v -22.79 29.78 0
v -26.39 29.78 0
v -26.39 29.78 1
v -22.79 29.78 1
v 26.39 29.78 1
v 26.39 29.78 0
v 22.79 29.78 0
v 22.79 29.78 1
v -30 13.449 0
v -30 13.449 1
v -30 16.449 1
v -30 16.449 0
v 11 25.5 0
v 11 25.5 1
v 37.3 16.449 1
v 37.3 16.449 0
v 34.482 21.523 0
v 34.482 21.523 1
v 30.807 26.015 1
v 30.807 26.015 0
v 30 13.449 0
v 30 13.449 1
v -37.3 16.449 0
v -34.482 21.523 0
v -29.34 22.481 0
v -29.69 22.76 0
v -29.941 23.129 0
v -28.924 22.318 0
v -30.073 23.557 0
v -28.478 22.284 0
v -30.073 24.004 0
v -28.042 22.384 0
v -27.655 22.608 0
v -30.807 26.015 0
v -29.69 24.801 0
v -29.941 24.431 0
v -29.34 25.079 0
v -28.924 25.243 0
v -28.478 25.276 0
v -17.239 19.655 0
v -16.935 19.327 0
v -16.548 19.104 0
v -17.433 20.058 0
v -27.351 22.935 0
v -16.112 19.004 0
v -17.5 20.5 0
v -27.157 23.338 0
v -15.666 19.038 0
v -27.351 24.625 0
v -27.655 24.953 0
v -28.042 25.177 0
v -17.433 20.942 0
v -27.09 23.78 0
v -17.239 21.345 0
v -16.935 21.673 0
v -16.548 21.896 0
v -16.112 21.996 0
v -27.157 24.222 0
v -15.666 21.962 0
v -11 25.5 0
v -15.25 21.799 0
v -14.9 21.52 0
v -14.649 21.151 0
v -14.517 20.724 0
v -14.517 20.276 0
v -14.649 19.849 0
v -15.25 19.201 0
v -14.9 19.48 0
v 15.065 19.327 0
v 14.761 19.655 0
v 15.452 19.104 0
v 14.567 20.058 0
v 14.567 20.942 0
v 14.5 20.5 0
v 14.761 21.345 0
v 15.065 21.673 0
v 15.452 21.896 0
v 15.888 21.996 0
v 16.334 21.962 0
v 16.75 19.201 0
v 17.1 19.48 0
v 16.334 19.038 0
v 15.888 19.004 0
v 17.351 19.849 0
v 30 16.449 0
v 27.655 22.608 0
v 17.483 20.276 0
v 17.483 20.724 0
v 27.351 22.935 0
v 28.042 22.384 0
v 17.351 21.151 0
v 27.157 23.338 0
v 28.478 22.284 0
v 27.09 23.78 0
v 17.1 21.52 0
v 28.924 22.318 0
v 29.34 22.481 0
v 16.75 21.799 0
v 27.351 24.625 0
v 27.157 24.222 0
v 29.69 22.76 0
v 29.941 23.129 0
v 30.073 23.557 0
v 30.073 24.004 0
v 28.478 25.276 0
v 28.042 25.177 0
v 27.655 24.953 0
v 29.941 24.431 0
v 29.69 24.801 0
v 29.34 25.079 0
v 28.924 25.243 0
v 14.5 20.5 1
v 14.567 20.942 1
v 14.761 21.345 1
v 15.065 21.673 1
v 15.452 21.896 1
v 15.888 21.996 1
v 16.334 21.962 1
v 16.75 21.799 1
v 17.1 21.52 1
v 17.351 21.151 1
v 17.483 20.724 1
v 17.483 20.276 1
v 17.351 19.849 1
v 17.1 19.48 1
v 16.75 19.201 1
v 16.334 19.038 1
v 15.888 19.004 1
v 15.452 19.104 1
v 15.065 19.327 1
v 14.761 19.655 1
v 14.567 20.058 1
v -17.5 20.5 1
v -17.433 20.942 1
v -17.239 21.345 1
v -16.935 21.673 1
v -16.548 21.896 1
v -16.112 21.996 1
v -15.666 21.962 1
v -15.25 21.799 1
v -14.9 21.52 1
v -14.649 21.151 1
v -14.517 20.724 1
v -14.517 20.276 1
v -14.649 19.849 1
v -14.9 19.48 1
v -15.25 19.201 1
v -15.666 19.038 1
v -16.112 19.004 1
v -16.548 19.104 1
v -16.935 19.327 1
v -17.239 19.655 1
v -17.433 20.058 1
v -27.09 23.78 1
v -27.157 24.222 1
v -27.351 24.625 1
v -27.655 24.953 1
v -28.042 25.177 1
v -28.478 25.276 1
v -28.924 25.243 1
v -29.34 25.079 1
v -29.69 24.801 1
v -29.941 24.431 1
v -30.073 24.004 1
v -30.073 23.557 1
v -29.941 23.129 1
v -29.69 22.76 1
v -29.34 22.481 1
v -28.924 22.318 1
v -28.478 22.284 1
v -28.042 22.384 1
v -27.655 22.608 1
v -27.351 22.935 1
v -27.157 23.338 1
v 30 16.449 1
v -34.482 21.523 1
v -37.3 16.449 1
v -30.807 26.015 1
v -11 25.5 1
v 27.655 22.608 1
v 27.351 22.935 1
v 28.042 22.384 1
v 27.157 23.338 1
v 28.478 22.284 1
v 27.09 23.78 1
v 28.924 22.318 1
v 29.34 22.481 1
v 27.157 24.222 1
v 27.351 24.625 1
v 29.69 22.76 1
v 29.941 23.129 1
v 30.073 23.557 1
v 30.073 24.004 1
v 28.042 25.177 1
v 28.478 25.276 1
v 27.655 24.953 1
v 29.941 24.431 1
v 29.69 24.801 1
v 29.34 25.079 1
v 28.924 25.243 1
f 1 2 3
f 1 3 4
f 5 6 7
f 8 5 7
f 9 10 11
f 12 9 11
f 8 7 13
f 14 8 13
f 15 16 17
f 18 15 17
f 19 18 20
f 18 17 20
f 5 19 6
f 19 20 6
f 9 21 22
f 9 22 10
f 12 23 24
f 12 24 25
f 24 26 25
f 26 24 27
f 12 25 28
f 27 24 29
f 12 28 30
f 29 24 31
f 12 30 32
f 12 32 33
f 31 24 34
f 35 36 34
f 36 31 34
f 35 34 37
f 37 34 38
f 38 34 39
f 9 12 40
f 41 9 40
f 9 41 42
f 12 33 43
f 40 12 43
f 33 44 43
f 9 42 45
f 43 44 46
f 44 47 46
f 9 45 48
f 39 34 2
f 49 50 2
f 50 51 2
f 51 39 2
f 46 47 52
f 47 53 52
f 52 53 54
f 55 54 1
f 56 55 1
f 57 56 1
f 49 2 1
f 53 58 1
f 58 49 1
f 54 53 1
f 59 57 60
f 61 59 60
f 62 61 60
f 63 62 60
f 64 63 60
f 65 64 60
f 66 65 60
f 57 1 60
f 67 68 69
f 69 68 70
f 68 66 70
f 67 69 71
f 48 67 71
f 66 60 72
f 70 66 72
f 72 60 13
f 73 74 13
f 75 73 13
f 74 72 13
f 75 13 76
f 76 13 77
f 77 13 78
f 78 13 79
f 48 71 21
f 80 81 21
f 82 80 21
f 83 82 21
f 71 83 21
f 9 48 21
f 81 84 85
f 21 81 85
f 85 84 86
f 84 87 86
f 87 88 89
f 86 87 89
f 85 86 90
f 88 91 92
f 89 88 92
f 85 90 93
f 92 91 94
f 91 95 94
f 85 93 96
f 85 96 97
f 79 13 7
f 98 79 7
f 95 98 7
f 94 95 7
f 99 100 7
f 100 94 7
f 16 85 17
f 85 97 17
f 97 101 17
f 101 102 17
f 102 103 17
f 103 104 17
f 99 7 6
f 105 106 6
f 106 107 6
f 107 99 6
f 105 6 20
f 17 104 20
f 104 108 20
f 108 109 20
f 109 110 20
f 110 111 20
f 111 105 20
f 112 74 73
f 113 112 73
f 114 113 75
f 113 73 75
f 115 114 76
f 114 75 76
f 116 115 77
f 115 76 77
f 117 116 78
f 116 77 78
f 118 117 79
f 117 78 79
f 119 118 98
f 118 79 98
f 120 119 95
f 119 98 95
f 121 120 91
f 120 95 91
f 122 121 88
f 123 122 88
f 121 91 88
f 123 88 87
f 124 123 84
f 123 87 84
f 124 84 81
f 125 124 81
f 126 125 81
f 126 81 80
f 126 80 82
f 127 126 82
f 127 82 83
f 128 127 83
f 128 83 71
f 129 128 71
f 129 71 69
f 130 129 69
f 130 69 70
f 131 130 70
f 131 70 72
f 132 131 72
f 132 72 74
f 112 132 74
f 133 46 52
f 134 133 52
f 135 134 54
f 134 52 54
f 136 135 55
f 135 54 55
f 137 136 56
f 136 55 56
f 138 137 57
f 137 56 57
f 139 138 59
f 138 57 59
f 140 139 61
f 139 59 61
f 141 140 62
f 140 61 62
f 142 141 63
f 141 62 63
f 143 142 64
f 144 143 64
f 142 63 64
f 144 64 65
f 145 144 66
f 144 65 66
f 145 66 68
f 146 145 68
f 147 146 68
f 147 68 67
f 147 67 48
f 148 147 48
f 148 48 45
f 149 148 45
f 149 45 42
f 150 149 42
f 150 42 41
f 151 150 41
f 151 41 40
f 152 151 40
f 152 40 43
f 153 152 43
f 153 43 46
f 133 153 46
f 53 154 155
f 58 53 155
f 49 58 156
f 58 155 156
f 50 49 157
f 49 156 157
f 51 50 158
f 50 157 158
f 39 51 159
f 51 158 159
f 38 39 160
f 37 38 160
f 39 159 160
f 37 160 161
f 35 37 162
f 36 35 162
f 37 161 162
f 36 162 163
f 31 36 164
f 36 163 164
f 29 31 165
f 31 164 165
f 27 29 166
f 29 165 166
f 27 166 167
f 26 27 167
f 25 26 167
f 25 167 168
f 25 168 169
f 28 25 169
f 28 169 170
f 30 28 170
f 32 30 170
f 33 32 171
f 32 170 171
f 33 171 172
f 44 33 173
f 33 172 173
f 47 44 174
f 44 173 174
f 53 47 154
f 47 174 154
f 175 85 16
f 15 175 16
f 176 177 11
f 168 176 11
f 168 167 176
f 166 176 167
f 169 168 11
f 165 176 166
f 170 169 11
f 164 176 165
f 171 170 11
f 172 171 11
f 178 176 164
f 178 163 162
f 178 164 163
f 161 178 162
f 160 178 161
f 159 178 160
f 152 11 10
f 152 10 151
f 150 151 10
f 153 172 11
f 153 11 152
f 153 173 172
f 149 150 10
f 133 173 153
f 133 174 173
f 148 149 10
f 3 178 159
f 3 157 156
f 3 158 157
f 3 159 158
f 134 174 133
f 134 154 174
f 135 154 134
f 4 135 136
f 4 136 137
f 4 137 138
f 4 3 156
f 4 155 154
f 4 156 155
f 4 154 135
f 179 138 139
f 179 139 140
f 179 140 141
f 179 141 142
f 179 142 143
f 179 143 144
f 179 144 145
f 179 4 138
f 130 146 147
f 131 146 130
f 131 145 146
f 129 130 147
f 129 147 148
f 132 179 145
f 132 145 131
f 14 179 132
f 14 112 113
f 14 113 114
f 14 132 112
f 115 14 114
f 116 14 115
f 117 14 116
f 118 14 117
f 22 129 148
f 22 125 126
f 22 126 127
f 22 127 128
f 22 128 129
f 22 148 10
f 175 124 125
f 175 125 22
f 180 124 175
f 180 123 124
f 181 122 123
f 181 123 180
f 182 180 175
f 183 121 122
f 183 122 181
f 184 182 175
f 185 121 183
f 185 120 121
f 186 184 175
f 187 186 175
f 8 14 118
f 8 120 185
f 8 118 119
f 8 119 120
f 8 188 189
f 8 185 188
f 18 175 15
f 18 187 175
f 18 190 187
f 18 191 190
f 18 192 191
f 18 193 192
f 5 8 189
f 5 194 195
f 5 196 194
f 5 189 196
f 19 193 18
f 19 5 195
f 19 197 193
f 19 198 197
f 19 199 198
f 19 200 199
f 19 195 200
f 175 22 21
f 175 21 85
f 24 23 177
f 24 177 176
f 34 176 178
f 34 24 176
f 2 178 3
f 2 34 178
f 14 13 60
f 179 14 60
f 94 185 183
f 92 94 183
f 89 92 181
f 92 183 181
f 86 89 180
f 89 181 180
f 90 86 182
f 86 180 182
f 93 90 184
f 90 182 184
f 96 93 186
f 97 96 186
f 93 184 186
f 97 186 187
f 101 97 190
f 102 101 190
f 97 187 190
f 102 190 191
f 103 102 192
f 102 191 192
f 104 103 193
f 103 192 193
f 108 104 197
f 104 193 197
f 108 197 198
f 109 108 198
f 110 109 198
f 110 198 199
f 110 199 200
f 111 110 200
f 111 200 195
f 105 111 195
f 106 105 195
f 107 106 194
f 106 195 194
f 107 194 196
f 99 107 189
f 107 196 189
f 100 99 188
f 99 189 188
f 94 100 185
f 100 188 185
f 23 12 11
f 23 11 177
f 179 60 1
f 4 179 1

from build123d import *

# Parameters (mm, degrees)
BOSS_EXTRUDE1_DEPTH = 3
SKETCH2_R           = 1.5
CUT_EXTRUDE3_DEPTH  = 3
CUT_EXTRUDE4_START  = -10
CUT_EXTRUDE4_DEPTH  = 10
BOSS_EXTRUDE2_START = -3
BOSS_EXTRUDE2_DEPTH = 3
SKETCH5_W           = 0.56
SKETCH5_H           = 32.898596714
CUT_EXTRUDE5_DEPTH  = 3
SKETCH6_W           = 0.2
SKETCH6_H           = 32.898596714
CUT_EXTRUDE6_DEPTH  = 3
SKETCH7_R           = 2
CUT_EXTRUDE8_DEPTH  = 3
BOSS_EXTRUDE3_START = -3
BOSS_EXTRUDE3_DEPTH = 3
CUT_EXTRUDE9_START  = -3
CUT_EXTRUDE9_DEPTH  = 3
BOSS_EXTRUDE5_START = -3
BOSS_EXTRUDE5_DEPTH = 3
CUT_EXTRUDE10_START = -2
CUT_EXTRUDE10_DEPTH = 2
CUT_EXTRUDE11_START = -3
CUT_EXTRUDE11_DEPTH = 3
SKETCH13_R          = 1.5
CUT_EXTRUDE12_DEPTH = 1
SKETCH15_R          = 1.5
CUT_EXTRUDE13_DEPTH = 10


with BuildPart() as part:
    # Sketch1 → Boss-Extrude1 (new body)
    with BuildSketch(Plane.XY):
        with BuildLine():
            Line((-11, 25.5), (-22.790038711, 29.780264196))
            ThreePointArc((-22.790038711, 29.780264196), (0, -37.5), (22.790038711, 29.780264196))
            Line((22.790038711, 29.780264196), (11, 25.5))
            Line((11, 25.5), (-11, 25.5))
        make_face()
    extrude(amount=BOSS_EXTRUDE1_DEPTH)

    # Sketch2 → Cut-Extrude3 (cut)
    with BuildSketch(Plane.XY.offset(3)):
        with Locations((-25.400000001, 10.496905453)):
            Circle(SKETCH2_R)
        with Locations((-25.399981845, -10.493094547)):
            Circle(SKETCH2_R)
        with Locations(Location((25.399981845, -10.493094547, 0), (0, 0, 180))):
            Circle(SKETCH2_R)
        with Locations(Location((25.400000001, 10.496905453, 0), (0, 0, 180))):
            Circle(SKETCH2_R)
    extrude(amount=-CUT_EXTRUDE3_DEPTH, mode=Mode.SUBTRACT)

    # Sketch3 → Cut-Extrude4 (cut)
    with BuildSketch(Plane.XY.offset(3).offset(CUT_EXTRUDE4_START)):
        with BuildLine():
            Line((-30.76, 21.449298357), (-30.76, -21.449298357))
            ThreePointArc((-30.76, -21.449298357), (-37.5, 0), (-30.76, 21.449298357))
        make_face()
        with BuildLine():
            Line((30.76, 21.449298357), (30.76, -21.449298357))
            ThreePointArc((30.76, -21.449298357), (37.5, 0), (30.76, 21.449298357))
        make_face()
    extrude(amount=CUT_EXTRUDE4_DEPTH, mode=Mode.SUBTRACT)

    # Sketch4 → Boss-Extrude2 (add)
    with BuildSketch(Plane.XY.offset(3).offset(BOSS_EXTRUDE2_START)):
        with BuildLine():
            Line((-30.76, -21.449298357), (-30.76, -16.449298357))
            Line((-30.76, -16.449298357), (-33.699711921, -16.449298357))
            ThreePointArc((-33.699711921, -16.449298357), (-32.32667034, -19.006219634), (-30.76, -21.449298357))
        make_face()
        with BuildLine():
            Line((-33.699711921, 16.449298357), (-30.76, 16.449298357))
            Line((-30.76, 16.449298357), (-30.76, 21.449298357))
            ThreePointArc((-30.76, 21.449298357), (-32.32667034, 19.006219634), (-33.699711921, 16.449298357))
        make_face()
        with BuildLine():
            Line((30.76, 21.449298357), (30.76, 16.449298357))
            Line((30.76, 16.449298357), (33.699711921, 16.449298357))
            ThreePointArc((33.699711921, 16.449298357), (32.32667034, 19.006219634), (30.76, 21.449298357))
        make_face()
        with BuildLine():
            Line((30.76, -16.449298357), (30.76, -21.449298357))
            ThreePointArc((30.76, -21.449298357), (32.32667034, -19.006219634), (33.699711921, -16.449298357))
            Line((33.699711921, -16.449298357), (30.76, -16.449298357))
        make_face()
    extrude(amount=BOSS_EXTRUDE2_DEPTH)

    # Sketch5 → Cut-Extrude5 (cut)
    with BuildSketch(Plane.XY.offset(3)):
        with Locations((-30.48, 0)):
            Rectangle(SKETCH5_W, SKETCH5_H)
        with Locations((30.48, 0)):
            Rectangle(SKETCH5_W, SKETCH5_H)
    extrude(amount=-CUT_EXTRUDE5_DEPTH, mode=Mode.SUBTRACT)

    # Sketch6 → Cut-Extrude6 (cut)
    with BuildSketch(Plane.XY.offset(3)):
        with Locations((-30.1, 0)):
            Rectangle(SKETCH6_W, SKETCH6_H)
        with Locations((30.1, 0)):
            Rectangle(SKETCH6_W, SKETCH6_H)
    extrude(amount=-CUT_EXTRUDE6_DEPTH, mode=Mode.SUBTRACT)

    # Sketch7 → Cut-Extrude8 (cut)
    with BuildSketch(Plane.XY.offset(3)):
        with Locations((-19.15, -21.55)):
            Circle(SKETCH7_R)
        with Locations(Location((19.15, -21.55, 0), (0, 0, 180))):
            Circle(SKETCH7_R)
    extrude(amount=-CUT_EXTRUDE8_DEPTH, mode=Mode.SUBTRACT)

    # Sketch8 → Boss-Extrude3 (add)
    with BuildSketch(Plane.XY.offset(3).offset(BOSS_EXTRUDE3_START)):
        with BuildLine():
            Line((-33.699711921, 16.449298357), (-37.299711921, 16.449298357))
            ThreePointArc((-37.299711921, 16.449298357), (-32.744884003, 23.851322108), (-26.390038711, 29.780264196))
            Line((-26.390038711, 29.780264196), (-22.790038711, 29.780264196))
            ThreePointArc((-22.790038711, 29.780264196), (-29.020710607, 23.749702226), (-33.699711921, 16.449298357))
        make_face()
        with BuildLine():
            Line((33.699711921, 16.449298357), (37.299711921, 16.449298357))
            ThreePointArc((37.299711921, 16.449298357), (32.744884003, 23.851322108), (26.390038711, 29.780264196))
            Line((26.390038711, 29.780264196), (22.790038711, 29.780264196))
            ThreePointArc((22.790038711, 29.780264196), (29.020710607, 23.749702226), (33.699711921, 16.449298357))
        make_face()
    extrude(amount=BOSS_EXTRUDE3_DEPTH)

    # Sketch9 → Cut-Extrude9 (cut)
    with BuildSketch(Plane.XY.offset(3).offset(CUT_EXTRUDE9_START)):
        with BuildLine():
            Line((4.733920151, -37.2), (-4.733920151, -37.2))
            ThreePointArc((-4.733920151, -37.2), (0, -37.5), (4.733920151, -37.2))
        make_face()
    extrude(amount=CUT_EXTRUDE9_DEPTH, mode=Mode.SUBTRACT)

    # Sketch10 → Boss-Extrude5 (add)
    with BuildSketch(Plane.XY.offset(3).offset(BOSS_EXTRUDE5_START)):
        with BuildLine():
            ThreePointArc((-4.733920151, -37.2), (-21.838816892, -30.484685938), (-33.699711921, -16.449298357))
            Line((-33.699711921, -16.449298357), (-37.299711921, -16.449298357))
            ThreePointArc((-37.299711921, -16.449298357), (-23.43831182, -30.624902723), (-4.733920151, -37.2))
        make_face()
        with BuildLine():
            ThreePointArc((33.699711921, -16.449298357), (21.838816892, -30.484685938), (4.733920151, -37.2))
            ThreePointArc((4.733920151, -37.2), (23.43831182, -30.624902723), (37.299711921, -16.449298357))
            Line((37.299711921, -16.449298357), (33.699711921, -16.449298357))
        make_face()
        with BuildLine():
            Line((4.733920151, -37.2), (-4.733920151, -37.2))
            ThreePointArc((-4.733920151, -37.2), (0, -37.457659609), (4.733920151, -37.2))
        make_face()
    extrude(amount=BOSS_EXTRUDE5_DEPTH)

    # Sketch11 → Cut-Extrude10 (cut)
    with BuildSketch(Plane.XY.offset(3).offset(CUT_EXTRUDE10_START)):
        with BuildLine():
            Line((-30, 16.449298357), (-30, 13.449298357))
            Line((-30, 13.449298357), (30, 13.449298357))
            Line((30, 13.449298357), (30, 16.449298357))
            Line((30, 16.449298357), (37.299711921, 16.449298357))
            ThreePointArc((37.299711921, 16.449298357), (32.744884003, 23.851322108), (26.390038711, 29.780264196))
            Line((26.390038711, 29.780264196), (22.790038711, 29.780264196))
            Line((22.790038711, 29.780264196), (11, 25.5))
            Line((11, 25.5), (-11, 25.5))
            Line((-11, 25.5), (-22.790038711, 29.780264196))
            Line((-22.790038711, 29.780264196), (-26.390038711, 29.780264196))
            ThreePointArc((-26.390038711, 29.780264196), (-32.744884003, 23.851322108), (-37.299711921, 16.449298357))
            Line((-37.299711921, 16.449298357), (-30, 16.449298357))
        make_face()
    extrude(amount=CUT_EXTRUDE10_DEPTH, mode=Mode.SUBTRACT)

    # Sketch12 → Cut-Extrude11 (cut)
    with BuildSketch(Plane.XY.offset(3).offset(CUT_EXTRUDE11_START)):
        with BuildLine():
            Line((-30, 13.449298357), (-30, -16.449298357))
            Line((-30, -16.449298357), (-37.299711921, -16.449298357))
            ThreePointArc((-37.299711921, -16.449298357), (0, -37.457659609), (37.299711921, -16.449298357))
            Line((37.299711921, -16.449298357), (30, -16.449298357))
            Line((30, -16.449298357), (30, 13.449298357))
            Line((30, 13.449298357), (-30, 13.449298357))
        make_face()
    extrude(amount=CUT_EXTRUDE11_DEPTH, mode=Mode.SUBTRACT)

    # Sketch13 → Cut-Extrude12 (cut)
    with BuildSketch(Plane.XY.offset(1)):
        with Locations((-28.590038711, 23.780264196)):
            Circle(SKETCH13_R)
        with Locations(Location((28.590038711, 23.780264196, 0), (0, 0, 180))):
            Circle(SKETCH13_R)
    extrude(amount=-CUT_EXTRUDE12_DEPTH, mode=Mode.SUBTRACT)

    # Sketch15 → Cut-Extrude13 (cut)
    with BuildSketch(Plane(origin=(0, 0, 0), x_dir=(-1, 0, 0), z_dir=(0, 0, -1))):
        with Locations((-16, 20.5)):
            Circle(SKETCH15_R)
        with Locations((16, 20.5)):
            Circle(SKETCH15_R)
    extrude(amount=-CUT_EXTRUDE13_DEPTH, mode=Mode.SUBTRACT)


solid = part.part
